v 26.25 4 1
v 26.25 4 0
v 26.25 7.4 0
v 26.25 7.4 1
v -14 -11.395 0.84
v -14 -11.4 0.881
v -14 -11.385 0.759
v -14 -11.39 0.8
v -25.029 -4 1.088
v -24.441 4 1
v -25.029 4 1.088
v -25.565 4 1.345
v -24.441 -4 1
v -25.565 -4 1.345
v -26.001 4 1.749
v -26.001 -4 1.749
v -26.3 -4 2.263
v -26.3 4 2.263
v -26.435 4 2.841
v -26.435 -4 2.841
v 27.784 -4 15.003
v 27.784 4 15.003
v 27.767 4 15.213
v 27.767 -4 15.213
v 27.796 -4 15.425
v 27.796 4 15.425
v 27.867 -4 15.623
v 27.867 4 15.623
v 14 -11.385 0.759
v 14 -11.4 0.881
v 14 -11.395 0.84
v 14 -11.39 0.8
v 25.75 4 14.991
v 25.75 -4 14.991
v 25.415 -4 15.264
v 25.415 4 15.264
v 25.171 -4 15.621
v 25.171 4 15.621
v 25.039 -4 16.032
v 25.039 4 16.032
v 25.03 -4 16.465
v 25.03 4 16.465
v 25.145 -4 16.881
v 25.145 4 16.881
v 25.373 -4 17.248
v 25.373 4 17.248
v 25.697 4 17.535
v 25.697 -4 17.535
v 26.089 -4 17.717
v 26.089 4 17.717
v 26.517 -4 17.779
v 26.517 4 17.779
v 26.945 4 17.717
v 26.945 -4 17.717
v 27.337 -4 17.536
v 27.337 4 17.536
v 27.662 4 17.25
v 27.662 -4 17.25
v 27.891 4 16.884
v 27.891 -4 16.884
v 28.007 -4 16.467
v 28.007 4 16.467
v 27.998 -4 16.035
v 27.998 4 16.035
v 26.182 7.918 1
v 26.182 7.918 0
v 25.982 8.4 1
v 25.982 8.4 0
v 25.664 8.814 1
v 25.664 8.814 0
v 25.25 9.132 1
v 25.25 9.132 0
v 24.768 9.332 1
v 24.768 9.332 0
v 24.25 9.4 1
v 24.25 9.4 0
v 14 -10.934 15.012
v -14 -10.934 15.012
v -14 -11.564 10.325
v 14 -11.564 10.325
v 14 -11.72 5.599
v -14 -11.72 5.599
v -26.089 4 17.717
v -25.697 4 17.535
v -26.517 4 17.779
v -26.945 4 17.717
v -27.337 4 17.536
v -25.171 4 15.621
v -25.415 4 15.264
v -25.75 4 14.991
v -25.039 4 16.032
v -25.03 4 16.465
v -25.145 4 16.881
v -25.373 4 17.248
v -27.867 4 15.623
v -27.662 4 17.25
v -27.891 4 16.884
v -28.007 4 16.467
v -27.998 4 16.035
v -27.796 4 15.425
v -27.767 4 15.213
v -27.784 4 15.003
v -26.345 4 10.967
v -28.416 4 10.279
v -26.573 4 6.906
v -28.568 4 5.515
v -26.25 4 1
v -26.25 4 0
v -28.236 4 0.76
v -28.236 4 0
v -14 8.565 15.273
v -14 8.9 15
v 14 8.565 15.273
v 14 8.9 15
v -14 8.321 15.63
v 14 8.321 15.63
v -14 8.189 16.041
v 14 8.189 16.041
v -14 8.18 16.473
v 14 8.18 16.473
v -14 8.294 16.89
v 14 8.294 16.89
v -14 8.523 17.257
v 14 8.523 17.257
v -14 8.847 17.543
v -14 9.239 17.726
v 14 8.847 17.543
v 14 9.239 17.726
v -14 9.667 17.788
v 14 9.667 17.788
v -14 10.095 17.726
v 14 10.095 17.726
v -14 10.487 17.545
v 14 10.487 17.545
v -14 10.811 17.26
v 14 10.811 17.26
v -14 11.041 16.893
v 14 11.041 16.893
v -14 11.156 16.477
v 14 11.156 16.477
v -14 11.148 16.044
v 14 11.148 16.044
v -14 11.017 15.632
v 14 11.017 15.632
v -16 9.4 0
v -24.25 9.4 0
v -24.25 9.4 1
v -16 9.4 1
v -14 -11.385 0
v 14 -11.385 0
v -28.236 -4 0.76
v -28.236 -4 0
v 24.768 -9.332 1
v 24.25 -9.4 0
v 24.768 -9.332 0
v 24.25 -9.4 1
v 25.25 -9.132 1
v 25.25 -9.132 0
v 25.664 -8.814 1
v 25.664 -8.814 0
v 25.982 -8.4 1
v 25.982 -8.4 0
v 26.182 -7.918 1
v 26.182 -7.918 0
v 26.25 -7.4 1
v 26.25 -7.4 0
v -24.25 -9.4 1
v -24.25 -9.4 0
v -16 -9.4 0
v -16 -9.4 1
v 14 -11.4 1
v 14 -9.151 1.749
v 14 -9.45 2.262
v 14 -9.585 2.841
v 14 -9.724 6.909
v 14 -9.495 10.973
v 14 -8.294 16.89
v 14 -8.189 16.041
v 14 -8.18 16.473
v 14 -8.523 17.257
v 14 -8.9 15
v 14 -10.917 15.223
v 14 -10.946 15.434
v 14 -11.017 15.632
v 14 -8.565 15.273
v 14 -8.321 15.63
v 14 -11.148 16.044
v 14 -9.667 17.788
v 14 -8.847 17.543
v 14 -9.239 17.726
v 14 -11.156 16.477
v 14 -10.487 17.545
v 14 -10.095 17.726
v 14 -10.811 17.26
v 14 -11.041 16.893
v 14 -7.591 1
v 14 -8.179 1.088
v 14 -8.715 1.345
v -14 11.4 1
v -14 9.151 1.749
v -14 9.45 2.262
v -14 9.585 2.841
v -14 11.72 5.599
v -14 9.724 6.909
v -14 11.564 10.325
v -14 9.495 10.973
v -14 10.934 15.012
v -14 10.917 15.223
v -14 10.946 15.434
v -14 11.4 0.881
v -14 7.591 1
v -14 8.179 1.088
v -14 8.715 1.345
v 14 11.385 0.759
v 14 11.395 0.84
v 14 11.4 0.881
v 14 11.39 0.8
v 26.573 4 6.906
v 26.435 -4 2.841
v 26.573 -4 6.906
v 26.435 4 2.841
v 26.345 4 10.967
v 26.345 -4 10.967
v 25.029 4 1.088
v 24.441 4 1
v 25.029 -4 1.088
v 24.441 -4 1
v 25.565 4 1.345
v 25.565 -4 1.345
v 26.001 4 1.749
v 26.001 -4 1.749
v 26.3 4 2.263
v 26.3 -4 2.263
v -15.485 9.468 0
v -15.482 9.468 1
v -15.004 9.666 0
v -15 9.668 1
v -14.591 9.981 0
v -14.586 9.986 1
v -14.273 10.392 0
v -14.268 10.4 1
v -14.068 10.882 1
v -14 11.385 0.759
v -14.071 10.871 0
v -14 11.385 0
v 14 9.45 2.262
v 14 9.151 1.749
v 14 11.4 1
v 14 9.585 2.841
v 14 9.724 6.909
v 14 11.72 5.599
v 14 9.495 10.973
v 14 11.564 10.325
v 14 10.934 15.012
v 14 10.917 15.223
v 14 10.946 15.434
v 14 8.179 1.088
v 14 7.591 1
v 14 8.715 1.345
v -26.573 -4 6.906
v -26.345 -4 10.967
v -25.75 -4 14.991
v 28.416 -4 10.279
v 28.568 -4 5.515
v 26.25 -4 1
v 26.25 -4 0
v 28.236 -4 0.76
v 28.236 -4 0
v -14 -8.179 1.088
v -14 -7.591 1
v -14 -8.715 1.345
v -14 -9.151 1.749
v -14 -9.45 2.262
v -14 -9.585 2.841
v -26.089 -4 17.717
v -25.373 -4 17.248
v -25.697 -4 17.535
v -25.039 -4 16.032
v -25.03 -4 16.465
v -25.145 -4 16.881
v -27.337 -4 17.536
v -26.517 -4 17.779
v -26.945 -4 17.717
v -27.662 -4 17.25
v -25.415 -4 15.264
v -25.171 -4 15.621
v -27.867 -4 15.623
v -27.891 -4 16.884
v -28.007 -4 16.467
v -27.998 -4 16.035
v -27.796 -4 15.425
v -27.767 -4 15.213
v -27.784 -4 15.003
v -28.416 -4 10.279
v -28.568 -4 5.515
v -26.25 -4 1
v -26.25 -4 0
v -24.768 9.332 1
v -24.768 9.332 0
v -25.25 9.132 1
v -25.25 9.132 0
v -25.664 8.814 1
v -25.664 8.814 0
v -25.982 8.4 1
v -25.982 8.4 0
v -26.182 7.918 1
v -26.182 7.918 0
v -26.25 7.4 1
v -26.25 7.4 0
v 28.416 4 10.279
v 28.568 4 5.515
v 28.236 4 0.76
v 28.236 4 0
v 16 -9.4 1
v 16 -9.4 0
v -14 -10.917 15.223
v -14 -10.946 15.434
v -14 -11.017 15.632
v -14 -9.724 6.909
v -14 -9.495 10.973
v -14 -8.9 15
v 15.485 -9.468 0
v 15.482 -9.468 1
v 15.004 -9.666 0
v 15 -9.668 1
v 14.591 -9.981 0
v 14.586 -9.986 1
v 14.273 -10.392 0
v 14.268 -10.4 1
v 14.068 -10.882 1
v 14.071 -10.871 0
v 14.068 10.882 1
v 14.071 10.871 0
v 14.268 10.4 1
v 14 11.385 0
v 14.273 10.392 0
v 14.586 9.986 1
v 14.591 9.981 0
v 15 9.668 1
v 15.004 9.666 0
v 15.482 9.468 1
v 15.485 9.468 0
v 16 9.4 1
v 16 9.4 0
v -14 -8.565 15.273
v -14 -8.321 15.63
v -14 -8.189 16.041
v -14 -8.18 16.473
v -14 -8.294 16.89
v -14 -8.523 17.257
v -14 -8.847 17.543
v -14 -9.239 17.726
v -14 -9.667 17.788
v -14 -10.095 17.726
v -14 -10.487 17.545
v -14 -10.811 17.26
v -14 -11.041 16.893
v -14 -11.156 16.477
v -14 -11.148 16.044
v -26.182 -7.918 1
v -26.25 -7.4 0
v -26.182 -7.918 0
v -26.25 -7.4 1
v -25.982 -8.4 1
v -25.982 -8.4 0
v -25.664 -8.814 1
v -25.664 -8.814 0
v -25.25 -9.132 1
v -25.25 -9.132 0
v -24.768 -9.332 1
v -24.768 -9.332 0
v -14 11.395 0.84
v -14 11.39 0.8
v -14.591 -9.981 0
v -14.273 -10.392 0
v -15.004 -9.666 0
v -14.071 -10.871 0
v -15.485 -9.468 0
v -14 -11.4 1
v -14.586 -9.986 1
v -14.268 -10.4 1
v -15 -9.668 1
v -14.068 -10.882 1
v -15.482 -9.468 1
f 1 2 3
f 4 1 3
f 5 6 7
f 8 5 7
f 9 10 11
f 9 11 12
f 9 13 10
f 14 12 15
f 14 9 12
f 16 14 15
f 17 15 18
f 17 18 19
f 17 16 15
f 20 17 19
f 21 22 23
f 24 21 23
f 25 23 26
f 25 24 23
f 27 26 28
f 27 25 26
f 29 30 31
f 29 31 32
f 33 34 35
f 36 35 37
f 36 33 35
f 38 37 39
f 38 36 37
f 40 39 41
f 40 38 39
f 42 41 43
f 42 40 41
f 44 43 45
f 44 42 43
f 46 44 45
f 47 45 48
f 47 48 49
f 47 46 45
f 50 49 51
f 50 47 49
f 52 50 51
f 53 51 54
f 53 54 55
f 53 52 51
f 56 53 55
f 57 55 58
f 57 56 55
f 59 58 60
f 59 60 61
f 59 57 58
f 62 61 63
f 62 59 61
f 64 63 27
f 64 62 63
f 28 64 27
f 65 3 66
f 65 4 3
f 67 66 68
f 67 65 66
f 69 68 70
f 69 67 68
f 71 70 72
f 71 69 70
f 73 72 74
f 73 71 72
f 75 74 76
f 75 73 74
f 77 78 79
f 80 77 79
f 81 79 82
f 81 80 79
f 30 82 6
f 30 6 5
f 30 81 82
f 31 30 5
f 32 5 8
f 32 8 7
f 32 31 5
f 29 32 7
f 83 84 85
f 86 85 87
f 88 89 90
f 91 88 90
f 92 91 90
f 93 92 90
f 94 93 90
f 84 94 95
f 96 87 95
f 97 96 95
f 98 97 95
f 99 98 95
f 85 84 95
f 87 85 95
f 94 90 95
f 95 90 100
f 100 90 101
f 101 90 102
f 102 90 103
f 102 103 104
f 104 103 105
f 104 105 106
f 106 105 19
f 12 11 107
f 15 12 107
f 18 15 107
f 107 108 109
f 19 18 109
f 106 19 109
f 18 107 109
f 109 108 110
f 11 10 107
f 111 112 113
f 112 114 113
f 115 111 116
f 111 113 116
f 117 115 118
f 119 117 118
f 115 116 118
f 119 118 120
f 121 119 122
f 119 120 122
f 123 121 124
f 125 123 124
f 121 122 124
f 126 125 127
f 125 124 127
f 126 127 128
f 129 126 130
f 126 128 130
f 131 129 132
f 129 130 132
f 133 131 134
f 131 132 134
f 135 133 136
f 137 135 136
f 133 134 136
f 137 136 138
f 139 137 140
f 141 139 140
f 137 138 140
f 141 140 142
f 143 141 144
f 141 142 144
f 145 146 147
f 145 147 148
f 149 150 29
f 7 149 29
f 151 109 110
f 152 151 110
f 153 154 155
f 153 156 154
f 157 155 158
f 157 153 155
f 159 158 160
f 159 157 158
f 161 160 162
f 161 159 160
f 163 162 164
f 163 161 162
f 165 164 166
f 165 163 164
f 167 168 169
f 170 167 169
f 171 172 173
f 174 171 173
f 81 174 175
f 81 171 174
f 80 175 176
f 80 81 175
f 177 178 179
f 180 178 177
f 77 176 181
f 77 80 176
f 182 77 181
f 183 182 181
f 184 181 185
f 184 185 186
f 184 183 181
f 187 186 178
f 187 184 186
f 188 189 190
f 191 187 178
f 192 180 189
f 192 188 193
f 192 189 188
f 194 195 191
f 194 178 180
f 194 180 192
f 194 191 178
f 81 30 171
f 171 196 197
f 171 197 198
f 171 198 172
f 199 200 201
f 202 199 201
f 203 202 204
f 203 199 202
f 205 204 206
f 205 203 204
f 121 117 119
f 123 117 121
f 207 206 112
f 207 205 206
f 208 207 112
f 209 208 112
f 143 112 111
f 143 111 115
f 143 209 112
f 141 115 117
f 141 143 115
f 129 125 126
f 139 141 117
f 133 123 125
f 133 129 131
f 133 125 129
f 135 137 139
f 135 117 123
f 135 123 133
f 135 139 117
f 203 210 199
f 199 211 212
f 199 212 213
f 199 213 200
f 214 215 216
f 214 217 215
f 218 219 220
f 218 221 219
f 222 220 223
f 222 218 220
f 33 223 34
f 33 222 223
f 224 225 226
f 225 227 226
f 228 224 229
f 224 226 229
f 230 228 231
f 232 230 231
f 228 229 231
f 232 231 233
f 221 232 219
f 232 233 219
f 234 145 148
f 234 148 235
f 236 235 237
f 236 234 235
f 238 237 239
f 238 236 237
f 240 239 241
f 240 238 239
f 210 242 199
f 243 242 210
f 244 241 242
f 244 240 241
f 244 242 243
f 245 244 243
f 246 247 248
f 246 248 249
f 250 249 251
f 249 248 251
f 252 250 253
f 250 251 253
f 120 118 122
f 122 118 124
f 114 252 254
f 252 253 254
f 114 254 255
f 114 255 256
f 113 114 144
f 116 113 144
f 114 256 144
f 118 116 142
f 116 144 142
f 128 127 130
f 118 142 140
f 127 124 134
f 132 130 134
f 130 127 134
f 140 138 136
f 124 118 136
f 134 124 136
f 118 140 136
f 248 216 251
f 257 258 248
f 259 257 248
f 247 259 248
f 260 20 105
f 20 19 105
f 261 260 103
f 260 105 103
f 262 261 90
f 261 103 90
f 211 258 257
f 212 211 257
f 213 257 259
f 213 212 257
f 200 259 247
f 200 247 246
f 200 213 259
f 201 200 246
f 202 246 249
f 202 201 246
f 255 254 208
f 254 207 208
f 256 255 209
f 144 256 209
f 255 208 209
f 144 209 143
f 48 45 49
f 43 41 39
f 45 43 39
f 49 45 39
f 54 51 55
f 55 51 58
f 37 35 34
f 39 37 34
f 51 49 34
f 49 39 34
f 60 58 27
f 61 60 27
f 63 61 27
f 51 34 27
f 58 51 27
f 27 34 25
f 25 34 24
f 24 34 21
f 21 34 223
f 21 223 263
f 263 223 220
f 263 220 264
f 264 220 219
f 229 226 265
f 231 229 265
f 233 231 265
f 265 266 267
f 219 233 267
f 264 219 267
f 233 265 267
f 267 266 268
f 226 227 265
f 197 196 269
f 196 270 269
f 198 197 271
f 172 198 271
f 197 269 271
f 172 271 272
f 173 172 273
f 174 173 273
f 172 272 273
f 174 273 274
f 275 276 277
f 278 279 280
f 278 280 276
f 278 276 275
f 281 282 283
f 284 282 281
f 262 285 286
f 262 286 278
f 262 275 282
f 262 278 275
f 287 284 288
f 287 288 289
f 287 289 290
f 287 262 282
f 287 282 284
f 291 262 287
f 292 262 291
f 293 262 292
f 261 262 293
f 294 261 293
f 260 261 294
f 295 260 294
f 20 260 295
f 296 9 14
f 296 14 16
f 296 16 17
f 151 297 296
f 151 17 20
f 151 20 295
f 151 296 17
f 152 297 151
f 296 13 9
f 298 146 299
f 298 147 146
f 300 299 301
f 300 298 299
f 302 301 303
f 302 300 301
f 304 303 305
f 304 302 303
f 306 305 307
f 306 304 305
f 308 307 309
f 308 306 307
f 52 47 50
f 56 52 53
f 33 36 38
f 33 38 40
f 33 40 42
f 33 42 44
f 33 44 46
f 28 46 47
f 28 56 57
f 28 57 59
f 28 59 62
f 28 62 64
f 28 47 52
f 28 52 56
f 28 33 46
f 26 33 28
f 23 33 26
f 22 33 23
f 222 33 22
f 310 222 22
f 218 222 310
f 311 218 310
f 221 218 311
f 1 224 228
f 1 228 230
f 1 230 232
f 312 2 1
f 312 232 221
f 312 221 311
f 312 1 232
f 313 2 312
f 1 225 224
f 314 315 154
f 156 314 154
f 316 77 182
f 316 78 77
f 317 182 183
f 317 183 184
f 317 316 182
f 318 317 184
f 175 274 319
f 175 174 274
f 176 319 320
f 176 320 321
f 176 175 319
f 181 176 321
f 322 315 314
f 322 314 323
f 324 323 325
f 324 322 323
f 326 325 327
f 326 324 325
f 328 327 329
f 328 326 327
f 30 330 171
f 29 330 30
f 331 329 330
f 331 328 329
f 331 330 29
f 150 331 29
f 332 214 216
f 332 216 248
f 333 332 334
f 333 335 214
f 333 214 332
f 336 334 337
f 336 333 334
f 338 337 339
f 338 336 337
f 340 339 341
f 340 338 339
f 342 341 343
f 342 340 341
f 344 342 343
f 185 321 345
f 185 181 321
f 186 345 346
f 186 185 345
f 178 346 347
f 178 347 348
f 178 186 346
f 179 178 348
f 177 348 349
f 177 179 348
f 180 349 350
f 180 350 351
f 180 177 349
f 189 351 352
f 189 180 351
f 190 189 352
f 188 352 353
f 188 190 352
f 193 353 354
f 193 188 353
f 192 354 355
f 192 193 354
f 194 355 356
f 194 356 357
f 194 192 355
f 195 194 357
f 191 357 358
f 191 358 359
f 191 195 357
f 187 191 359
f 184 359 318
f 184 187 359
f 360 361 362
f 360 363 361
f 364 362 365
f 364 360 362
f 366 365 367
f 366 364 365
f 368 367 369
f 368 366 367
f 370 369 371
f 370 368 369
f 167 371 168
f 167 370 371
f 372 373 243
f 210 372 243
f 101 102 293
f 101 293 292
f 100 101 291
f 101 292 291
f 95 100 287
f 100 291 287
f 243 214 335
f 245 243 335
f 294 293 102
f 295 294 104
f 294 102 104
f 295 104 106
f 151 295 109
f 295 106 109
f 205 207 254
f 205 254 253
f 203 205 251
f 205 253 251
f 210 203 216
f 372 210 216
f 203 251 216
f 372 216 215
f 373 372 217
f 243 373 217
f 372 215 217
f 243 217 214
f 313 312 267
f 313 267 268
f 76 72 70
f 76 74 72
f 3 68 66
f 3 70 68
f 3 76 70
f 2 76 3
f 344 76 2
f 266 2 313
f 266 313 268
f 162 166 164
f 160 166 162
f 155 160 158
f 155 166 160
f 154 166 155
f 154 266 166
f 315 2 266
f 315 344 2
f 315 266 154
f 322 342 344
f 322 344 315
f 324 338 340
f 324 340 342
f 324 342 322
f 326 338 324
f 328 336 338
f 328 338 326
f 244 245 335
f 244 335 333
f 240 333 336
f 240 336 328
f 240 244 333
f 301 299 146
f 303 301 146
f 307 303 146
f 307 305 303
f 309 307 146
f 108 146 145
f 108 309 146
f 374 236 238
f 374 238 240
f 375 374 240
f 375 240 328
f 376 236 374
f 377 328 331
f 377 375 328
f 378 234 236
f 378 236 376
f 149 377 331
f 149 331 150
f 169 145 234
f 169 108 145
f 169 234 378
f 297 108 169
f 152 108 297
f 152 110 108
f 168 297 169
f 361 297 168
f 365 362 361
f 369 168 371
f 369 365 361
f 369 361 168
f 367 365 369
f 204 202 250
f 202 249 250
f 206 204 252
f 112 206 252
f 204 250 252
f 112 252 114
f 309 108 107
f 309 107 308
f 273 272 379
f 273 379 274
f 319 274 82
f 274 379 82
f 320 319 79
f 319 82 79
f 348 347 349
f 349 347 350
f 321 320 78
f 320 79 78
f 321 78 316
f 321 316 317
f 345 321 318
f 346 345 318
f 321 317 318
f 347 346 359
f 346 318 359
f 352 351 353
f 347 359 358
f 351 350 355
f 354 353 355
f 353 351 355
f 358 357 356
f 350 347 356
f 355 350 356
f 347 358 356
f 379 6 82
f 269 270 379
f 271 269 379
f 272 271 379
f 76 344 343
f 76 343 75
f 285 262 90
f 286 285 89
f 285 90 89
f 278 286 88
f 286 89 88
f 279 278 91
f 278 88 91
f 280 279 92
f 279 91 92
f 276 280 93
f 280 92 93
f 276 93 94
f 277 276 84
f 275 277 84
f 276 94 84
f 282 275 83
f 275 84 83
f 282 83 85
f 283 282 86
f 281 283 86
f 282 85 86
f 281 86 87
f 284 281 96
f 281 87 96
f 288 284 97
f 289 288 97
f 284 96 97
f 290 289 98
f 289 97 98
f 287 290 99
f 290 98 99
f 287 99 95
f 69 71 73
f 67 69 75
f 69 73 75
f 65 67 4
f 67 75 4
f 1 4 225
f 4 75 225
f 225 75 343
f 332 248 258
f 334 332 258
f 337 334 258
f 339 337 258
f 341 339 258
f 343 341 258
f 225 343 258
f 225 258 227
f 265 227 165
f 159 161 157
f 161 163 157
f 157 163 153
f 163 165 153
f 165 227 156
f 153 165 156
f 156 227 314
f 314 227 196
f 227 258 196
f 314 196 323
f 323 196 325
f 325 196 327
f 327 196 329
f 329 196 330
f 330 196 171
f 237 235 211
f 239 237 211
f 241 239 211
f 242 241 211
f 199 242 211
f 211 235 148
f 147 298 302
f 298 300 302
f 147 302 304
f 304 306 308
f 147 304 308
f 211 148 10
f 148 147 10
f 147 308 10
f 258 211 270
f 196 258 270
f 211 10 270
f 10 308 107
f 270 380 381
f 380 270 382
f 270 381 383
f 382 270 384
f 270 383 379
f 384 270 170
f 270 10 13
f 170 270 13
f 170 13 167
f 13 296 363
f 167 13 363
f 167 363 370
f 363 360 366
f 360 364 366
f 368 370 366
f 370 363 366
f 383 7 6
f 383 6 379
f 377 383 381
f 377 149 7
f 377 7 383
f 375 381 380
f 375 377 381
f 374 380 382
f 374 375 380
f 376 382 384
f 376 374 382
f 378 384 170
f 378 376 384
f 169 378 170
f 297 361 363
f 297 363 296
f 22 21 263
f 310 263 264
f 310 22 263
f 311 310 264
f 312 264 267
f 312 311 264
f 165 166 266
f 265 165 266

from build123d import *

# Parameters (mm, degrees)
SKETCH1_W           = 52.5
SKETCH1_H           = 18.8
BOSS_EXTRUDE1_DEPTH = 1
BOSS_EXTRUDE2_DEPTH = 4
BOSS_EXTRUDE3_DEPTH = 14
FILLET1_R           = 2
FILLET2_R           = 2
FILLET3_R           = 1


with BuildPart() as part:
    # Sketch1 → Boss-Extrude1 (new body)
    with BuildSketch(Plane.XY):
        Rectangle(SKETCH1_W, SKETCH1_H)
    extrude(amount=BOSS_EXTRUDE1_DEPTH)

    # Sketch2 → Boss-Extrude2 (add, symmetric)
    with BuildSketch(Plane(origin=(0, 0, 0), x_dir=(1, 0, 0), z_dir=(0, 1, 0))):
        with BuildLine():
            Line((-26.25, 0), (-26.25, -1))
            ThreePointArc((-26.25, -1), (-26.547428998, -8.015097806), (-25.75, -14.99106858))
            ThreePointArc((-25.75, -14.99106858), (-26.232288437, -17.75177498), (-27.713282794, -15.372540297))
            ThreePointArc((-27.713282794, -15.372540297), (-28.546153081, -8.086526378), (-28.235505016, -0.759646447))
            Line((-28.235505016, -0.759646447), (-28.235505016, 0))
            Line((-28.235505016, 0), (-26.25, 0))
        make_face()
    boss_extrude2 = extrude(amount=BOSS_EXTRUDE2_DEPTH, both=True)

    # Mirror1: Boss-Extrude2 across plane
    add(boss_extrude2.mirror(Plane(origin=(0, 0, 0), x_dir=(0, 0, 1), z_dir=(1, 0, 0))))

    # Sketch3 → Boss-Extrude3 (add, symmetric)
    with BuildSketch(Plane(origin=(0, 0, 0), x_dir=(0, 0, -1), z_dir=(1, 0, 0))):
        with BuildLine():
            Line((0, 9.4), (-1, 9.4))
            ThreePointArc((-1, 9.4), (-8.019576143, 9.698132003), (-15, 8.9))
            ThreePointArc((-15, 8.9), (-17.760743831, 9.382074127), (-15.381624121, 10.863253175))
            ThreePointArc((-15.381624121, 10.863253175), (-8.090959204, 11.696857712), (-0.759401899, 11.385475397))
            Line((-0.759401899, 11.385475397), (0, 11.385475397))
            Line((0, 11.385475397), (0, 9.4))
        make_face()
    boss_extrude3 = extrude(amount=BOSS_EXTRUDE3_DEPTH, both=True)

    # Mirror2: Boss-Extrude3 across plane
    add(boss_extrude3.mirror(Plane.ZX))

    # Fillet1
    fillet1_edges = [part.edges().sort_by_distance(p)[0] for p in [
        (0, 9.4, 1),
        (-26.25, 0, 1),
        (0, -9.4, 1),
        (26.25, 0, 1),
        (26.25, -9.4, 0.5),
        (26.25, 9.4, 0.5),
        (-26.25, -9.4, 0.5),
        (-26.25, 9.4, 0.5),
    ]]
    fillet(fillet1_edges, radius=FILLET1_R)

    # Fillet2
    # the kernel refuses this fillet: 2 mm, written as the material it adds along each edge
    with BuildSketch(Plane(origin=(-14, -9.4, 0), x_dir=(0, -1, 0), z_dir=(0, 0, 1))) as fillet2_piece_1_section:
        with BuildLine():
            CenterArc((FILLET2_R, -FILLET2_R), FILLET2_R, 90, 90)
            Line((0, -FILLET2_R), (0, 0))
            Line((0, 0), (FILLET2_R, 0))
        make_face()
    fillet2_piece_1 = extrude(amount=1, mode=Mode.PRIVATE)
    fillet2_piece_1 = split(fillet2_piece_1, bisect_by=Plane(origin=(-14.000636708, -11.385475397, 0.169006007), z_dir=(0, 1, 0)), keep=Keep.TOP, mode=Mode.PRIVATE)
    add(fillet2_piece_1)
    with BuildSketch(Plane(origin=(-14, -9.4, -5), x_dir=(0, -1, 0), z_dir=(0, 0, 1))) as fillet2_piece_2_section:
        with BuildLine():
            CenterArc((FILLET2_R, -FILLET2_R), FILLET2_R, 90, 90)
            Line((0, -FILLET2_R), (0, 0))
            Line((0, 0), (FILLET2_R, 0))
        make_face()
    fillet2_piece_2 = extrude(amount=6, mode=Mode.PRIVATE)
    fillet2_piece_2 = split(fillet2_piece_2, bisect_by=Plane(origin=(-14.000016578, -11.385475397, 0.893450241), z_dir=(0, -1, 0)), keep=Keep.TOP, mode=Mode.PRIVATE)
    fillet2_piece_2 = fillet2_piece_2 & Plane(origin=(-14.000016578, 35.273196442, 6.41345727), x_dir=(0, -0.9816265876102759, 0.19081206066862103), z_dir=(1, 0, 0)) * Cylinder(47, 21, mode=Mode.PRIVATE)
    add(fillet2_piece_2)
    with BuildSketch(Plane(origin=(14, -9.4, 0), x_dir=(1, 0, 0), z_dir=(0, 0, 1))) as fillet2_piece_3_section:
        with BuildLine():
            CenterArc((FILLET2_R, -FILLET2_R), FILLET2_R, 90, 90)
            Line((0, -FILLET2_R), (0, 0))
            Line((0, 0), (FILLET2_R, 0))
        make_face()
    fillet2_piece_3 = extrude(amount=1, mode=Mode.PRIVATE)
    fillet2_piece_3 = split(fillet2_piece_3, bisect_by=Plane(origin=(14.446749005, -11.385475397, 0.500009641), z_dir=(0, 1, 0)), keep=Keep.TOP, mode=Mode.PRIVATE)
    add(fillet2_piece_3)
    with BuildSketch(Plane(origin=(14, -9.4, -5), x_dir=(1, 0, 0), z_dir=(0, 0, 1))) as fillet2_piece_4_section:
        with BuildLine():
            CenterArc((FILLET2_R, -FILLET2_R), FILLET2_R, 90, 90)
            Line((0, -FILLET2_R), (0, 0))
            Line((0, 0), (FILLET2_R, 0))
        make_face()
    fillet2_piece_4 = extrude(amount=6, mode=Mode.PRIVATE)
    fillet2_piece_4 = split(fillet2_piece_4, bisect_by=Plane(origin=(14.000016578, -11.385475397, 0.893450335), z_dir=(0, -1, 0)), keep=Keep.TOP, mode=Mode.PRIVATE)
    fillet2_piece_4 = fillet2_piece_4 & Plane(origin=(14.000016578, 35.273196442, 6.41345727), x_dir=(0, -0.9816265876102759, 0.19081206066862103), z_dir=(1, 0, 0)) * Cylinder(47, 20, mode=Mode.PRIVATE)
    add(fillet2_piece_4)
    with BuildSketch(Plane(origin=(14, 9.4, 0), x_dir=(1, 0, 0), z_dir=(0, 0, 1))) as fillet2_piece_5_section:
        with BuildLine():
            CenterArc((FILLET2_R, FILLET2_R), FILLET2_R, 180, 90)
            Line((0, FILLET2_R), (0, 0))
            Line((0, 0), (FILLET2_R, 0))
        make_face()
    fillet2_piece_5 = extrude(amount=1, mode=Mode.PRIVATE)
    fillet2_piece_5 = split(fillet2_piece_5, bisect_by=Plane(origin=(14.446749005, 11.385475397, 0.500009641), z_dir=(0, -1, 0)), keep=Keep.TOP, mode=Mode.PRIVATE)
    add(fillet2_piece_5)
    with BuildSketch(Plane(origin=(14, 9.4, -5), x_dir=(1, 0, 0), z_dir=(0, 0, 1))) as fillet2_piece_6_section:
        with BuildLine():
            CenterArc((FILLET2_R, FILLET2_R), FILLET2_R, 180, 90)
            Line((0, FILLET2_R), (0, 0))
            Line((0, 0), (FILLET2_R, 0))
        make_face()
    fillet2_piece_6 = extrude(amount=6, mode=Mode.PRIVATE)
    fillet2_piece_6 = split(fillet2_piece_6, bisect_by=Plane(origin=(14.000016578, 11.385475397, 0.893450335), z_dir=(0, 1, 0)), keep=Keep.TOP, mode=Mode.PRIVATE)
    fillet2_piece_6 = fillet2_piece_6 & Plane(origin=(14.000016578, -35.273196442, 6.41345727), x_dir=(0, 0.9816265876102759, 0.19081206066862103), z_dir=(1, 0, 0)) * Cylinder(47, 21, mode=Mode.PRIVATE)
    add(fillet2_piece_6)
    with BuildSketch(Plane(origin=(-14, 9.4, 0), x_dir=(0, 1, 0), z_dir=(0, 0, 1))) as fillet2_piece_7_section:
        with BuildLine():
            CenterArc((FILLET2_R, FILLET2_R), FILLET2_R, 180, 90)
            Line((0, FILLET2_R), (0, 0))
            Line((0, 0), (FILLET2_R, 0))
        make_face()
    fillet2_piece_7 = extrude(amount=1, mode=Mode.PRIVATE)
    fillet2_piece_7 = split(fillet2_piece_7, bisect_by=Plane(origin=(-14.000636708, 11.385475397, 0.169006007), z_dir=(0, -1, 0)), keep=Keep.TOP, mode=Mode.PRIVATE)
    add(fillet2_piece_7)
    with BuildSketch(Plane(origin=(-14, 9.4, -5), x_dir=(0, 1, 0), z_dir=(0, 0, 1))) as fillet2_piece_8_section:
        with BuildLine():
            CenterArc((FILLET2_R, FILLET2_R), FILLET2_R, 180, 90)
            Line((0, FILLET2_R), (0, 0))
            Line((0, 0), (FILLET2_R, 0))
        make_face()
    fillet2_piece_8 = extrude(amount=6, mode=Mode.PRIVATE)
    fillet2_piece_8 = split(fillet2_piece_8, bisect_by=Plane(origin=(-14.000016578, 11.385475397, 0.893450241), z_dir=(0, 1, 0)), keep=Keep.TOP, mode=Mode.PRIVATE)
    fillet2_piece_8 = fillet2_piece_8 & Plane(origin=(-14.000016578, -35.273196442, 6.41345727), x_dir=(0, 0.9816265876102759, 0.19081206066862103), z_dir=(1, 0, 0)) * Cylinder(47, 20, mode=Mode.PRIVATE)
    add(fillet2_piece_8)

    # Fillet3
    fillet3_edges = [part.edges().sort_by_distance(p)[0] for p in [
        (-27.713282794, 0, 15.372540297),
        (27.713282794, 0, 15.372540297),
        (0, 10.863253175, 15.381624121),
        (0, -10.863253175, 15.381624121),
    ]]
    fillet(fillet3_edges, radius=FILLET3_R)


solid = part.part
